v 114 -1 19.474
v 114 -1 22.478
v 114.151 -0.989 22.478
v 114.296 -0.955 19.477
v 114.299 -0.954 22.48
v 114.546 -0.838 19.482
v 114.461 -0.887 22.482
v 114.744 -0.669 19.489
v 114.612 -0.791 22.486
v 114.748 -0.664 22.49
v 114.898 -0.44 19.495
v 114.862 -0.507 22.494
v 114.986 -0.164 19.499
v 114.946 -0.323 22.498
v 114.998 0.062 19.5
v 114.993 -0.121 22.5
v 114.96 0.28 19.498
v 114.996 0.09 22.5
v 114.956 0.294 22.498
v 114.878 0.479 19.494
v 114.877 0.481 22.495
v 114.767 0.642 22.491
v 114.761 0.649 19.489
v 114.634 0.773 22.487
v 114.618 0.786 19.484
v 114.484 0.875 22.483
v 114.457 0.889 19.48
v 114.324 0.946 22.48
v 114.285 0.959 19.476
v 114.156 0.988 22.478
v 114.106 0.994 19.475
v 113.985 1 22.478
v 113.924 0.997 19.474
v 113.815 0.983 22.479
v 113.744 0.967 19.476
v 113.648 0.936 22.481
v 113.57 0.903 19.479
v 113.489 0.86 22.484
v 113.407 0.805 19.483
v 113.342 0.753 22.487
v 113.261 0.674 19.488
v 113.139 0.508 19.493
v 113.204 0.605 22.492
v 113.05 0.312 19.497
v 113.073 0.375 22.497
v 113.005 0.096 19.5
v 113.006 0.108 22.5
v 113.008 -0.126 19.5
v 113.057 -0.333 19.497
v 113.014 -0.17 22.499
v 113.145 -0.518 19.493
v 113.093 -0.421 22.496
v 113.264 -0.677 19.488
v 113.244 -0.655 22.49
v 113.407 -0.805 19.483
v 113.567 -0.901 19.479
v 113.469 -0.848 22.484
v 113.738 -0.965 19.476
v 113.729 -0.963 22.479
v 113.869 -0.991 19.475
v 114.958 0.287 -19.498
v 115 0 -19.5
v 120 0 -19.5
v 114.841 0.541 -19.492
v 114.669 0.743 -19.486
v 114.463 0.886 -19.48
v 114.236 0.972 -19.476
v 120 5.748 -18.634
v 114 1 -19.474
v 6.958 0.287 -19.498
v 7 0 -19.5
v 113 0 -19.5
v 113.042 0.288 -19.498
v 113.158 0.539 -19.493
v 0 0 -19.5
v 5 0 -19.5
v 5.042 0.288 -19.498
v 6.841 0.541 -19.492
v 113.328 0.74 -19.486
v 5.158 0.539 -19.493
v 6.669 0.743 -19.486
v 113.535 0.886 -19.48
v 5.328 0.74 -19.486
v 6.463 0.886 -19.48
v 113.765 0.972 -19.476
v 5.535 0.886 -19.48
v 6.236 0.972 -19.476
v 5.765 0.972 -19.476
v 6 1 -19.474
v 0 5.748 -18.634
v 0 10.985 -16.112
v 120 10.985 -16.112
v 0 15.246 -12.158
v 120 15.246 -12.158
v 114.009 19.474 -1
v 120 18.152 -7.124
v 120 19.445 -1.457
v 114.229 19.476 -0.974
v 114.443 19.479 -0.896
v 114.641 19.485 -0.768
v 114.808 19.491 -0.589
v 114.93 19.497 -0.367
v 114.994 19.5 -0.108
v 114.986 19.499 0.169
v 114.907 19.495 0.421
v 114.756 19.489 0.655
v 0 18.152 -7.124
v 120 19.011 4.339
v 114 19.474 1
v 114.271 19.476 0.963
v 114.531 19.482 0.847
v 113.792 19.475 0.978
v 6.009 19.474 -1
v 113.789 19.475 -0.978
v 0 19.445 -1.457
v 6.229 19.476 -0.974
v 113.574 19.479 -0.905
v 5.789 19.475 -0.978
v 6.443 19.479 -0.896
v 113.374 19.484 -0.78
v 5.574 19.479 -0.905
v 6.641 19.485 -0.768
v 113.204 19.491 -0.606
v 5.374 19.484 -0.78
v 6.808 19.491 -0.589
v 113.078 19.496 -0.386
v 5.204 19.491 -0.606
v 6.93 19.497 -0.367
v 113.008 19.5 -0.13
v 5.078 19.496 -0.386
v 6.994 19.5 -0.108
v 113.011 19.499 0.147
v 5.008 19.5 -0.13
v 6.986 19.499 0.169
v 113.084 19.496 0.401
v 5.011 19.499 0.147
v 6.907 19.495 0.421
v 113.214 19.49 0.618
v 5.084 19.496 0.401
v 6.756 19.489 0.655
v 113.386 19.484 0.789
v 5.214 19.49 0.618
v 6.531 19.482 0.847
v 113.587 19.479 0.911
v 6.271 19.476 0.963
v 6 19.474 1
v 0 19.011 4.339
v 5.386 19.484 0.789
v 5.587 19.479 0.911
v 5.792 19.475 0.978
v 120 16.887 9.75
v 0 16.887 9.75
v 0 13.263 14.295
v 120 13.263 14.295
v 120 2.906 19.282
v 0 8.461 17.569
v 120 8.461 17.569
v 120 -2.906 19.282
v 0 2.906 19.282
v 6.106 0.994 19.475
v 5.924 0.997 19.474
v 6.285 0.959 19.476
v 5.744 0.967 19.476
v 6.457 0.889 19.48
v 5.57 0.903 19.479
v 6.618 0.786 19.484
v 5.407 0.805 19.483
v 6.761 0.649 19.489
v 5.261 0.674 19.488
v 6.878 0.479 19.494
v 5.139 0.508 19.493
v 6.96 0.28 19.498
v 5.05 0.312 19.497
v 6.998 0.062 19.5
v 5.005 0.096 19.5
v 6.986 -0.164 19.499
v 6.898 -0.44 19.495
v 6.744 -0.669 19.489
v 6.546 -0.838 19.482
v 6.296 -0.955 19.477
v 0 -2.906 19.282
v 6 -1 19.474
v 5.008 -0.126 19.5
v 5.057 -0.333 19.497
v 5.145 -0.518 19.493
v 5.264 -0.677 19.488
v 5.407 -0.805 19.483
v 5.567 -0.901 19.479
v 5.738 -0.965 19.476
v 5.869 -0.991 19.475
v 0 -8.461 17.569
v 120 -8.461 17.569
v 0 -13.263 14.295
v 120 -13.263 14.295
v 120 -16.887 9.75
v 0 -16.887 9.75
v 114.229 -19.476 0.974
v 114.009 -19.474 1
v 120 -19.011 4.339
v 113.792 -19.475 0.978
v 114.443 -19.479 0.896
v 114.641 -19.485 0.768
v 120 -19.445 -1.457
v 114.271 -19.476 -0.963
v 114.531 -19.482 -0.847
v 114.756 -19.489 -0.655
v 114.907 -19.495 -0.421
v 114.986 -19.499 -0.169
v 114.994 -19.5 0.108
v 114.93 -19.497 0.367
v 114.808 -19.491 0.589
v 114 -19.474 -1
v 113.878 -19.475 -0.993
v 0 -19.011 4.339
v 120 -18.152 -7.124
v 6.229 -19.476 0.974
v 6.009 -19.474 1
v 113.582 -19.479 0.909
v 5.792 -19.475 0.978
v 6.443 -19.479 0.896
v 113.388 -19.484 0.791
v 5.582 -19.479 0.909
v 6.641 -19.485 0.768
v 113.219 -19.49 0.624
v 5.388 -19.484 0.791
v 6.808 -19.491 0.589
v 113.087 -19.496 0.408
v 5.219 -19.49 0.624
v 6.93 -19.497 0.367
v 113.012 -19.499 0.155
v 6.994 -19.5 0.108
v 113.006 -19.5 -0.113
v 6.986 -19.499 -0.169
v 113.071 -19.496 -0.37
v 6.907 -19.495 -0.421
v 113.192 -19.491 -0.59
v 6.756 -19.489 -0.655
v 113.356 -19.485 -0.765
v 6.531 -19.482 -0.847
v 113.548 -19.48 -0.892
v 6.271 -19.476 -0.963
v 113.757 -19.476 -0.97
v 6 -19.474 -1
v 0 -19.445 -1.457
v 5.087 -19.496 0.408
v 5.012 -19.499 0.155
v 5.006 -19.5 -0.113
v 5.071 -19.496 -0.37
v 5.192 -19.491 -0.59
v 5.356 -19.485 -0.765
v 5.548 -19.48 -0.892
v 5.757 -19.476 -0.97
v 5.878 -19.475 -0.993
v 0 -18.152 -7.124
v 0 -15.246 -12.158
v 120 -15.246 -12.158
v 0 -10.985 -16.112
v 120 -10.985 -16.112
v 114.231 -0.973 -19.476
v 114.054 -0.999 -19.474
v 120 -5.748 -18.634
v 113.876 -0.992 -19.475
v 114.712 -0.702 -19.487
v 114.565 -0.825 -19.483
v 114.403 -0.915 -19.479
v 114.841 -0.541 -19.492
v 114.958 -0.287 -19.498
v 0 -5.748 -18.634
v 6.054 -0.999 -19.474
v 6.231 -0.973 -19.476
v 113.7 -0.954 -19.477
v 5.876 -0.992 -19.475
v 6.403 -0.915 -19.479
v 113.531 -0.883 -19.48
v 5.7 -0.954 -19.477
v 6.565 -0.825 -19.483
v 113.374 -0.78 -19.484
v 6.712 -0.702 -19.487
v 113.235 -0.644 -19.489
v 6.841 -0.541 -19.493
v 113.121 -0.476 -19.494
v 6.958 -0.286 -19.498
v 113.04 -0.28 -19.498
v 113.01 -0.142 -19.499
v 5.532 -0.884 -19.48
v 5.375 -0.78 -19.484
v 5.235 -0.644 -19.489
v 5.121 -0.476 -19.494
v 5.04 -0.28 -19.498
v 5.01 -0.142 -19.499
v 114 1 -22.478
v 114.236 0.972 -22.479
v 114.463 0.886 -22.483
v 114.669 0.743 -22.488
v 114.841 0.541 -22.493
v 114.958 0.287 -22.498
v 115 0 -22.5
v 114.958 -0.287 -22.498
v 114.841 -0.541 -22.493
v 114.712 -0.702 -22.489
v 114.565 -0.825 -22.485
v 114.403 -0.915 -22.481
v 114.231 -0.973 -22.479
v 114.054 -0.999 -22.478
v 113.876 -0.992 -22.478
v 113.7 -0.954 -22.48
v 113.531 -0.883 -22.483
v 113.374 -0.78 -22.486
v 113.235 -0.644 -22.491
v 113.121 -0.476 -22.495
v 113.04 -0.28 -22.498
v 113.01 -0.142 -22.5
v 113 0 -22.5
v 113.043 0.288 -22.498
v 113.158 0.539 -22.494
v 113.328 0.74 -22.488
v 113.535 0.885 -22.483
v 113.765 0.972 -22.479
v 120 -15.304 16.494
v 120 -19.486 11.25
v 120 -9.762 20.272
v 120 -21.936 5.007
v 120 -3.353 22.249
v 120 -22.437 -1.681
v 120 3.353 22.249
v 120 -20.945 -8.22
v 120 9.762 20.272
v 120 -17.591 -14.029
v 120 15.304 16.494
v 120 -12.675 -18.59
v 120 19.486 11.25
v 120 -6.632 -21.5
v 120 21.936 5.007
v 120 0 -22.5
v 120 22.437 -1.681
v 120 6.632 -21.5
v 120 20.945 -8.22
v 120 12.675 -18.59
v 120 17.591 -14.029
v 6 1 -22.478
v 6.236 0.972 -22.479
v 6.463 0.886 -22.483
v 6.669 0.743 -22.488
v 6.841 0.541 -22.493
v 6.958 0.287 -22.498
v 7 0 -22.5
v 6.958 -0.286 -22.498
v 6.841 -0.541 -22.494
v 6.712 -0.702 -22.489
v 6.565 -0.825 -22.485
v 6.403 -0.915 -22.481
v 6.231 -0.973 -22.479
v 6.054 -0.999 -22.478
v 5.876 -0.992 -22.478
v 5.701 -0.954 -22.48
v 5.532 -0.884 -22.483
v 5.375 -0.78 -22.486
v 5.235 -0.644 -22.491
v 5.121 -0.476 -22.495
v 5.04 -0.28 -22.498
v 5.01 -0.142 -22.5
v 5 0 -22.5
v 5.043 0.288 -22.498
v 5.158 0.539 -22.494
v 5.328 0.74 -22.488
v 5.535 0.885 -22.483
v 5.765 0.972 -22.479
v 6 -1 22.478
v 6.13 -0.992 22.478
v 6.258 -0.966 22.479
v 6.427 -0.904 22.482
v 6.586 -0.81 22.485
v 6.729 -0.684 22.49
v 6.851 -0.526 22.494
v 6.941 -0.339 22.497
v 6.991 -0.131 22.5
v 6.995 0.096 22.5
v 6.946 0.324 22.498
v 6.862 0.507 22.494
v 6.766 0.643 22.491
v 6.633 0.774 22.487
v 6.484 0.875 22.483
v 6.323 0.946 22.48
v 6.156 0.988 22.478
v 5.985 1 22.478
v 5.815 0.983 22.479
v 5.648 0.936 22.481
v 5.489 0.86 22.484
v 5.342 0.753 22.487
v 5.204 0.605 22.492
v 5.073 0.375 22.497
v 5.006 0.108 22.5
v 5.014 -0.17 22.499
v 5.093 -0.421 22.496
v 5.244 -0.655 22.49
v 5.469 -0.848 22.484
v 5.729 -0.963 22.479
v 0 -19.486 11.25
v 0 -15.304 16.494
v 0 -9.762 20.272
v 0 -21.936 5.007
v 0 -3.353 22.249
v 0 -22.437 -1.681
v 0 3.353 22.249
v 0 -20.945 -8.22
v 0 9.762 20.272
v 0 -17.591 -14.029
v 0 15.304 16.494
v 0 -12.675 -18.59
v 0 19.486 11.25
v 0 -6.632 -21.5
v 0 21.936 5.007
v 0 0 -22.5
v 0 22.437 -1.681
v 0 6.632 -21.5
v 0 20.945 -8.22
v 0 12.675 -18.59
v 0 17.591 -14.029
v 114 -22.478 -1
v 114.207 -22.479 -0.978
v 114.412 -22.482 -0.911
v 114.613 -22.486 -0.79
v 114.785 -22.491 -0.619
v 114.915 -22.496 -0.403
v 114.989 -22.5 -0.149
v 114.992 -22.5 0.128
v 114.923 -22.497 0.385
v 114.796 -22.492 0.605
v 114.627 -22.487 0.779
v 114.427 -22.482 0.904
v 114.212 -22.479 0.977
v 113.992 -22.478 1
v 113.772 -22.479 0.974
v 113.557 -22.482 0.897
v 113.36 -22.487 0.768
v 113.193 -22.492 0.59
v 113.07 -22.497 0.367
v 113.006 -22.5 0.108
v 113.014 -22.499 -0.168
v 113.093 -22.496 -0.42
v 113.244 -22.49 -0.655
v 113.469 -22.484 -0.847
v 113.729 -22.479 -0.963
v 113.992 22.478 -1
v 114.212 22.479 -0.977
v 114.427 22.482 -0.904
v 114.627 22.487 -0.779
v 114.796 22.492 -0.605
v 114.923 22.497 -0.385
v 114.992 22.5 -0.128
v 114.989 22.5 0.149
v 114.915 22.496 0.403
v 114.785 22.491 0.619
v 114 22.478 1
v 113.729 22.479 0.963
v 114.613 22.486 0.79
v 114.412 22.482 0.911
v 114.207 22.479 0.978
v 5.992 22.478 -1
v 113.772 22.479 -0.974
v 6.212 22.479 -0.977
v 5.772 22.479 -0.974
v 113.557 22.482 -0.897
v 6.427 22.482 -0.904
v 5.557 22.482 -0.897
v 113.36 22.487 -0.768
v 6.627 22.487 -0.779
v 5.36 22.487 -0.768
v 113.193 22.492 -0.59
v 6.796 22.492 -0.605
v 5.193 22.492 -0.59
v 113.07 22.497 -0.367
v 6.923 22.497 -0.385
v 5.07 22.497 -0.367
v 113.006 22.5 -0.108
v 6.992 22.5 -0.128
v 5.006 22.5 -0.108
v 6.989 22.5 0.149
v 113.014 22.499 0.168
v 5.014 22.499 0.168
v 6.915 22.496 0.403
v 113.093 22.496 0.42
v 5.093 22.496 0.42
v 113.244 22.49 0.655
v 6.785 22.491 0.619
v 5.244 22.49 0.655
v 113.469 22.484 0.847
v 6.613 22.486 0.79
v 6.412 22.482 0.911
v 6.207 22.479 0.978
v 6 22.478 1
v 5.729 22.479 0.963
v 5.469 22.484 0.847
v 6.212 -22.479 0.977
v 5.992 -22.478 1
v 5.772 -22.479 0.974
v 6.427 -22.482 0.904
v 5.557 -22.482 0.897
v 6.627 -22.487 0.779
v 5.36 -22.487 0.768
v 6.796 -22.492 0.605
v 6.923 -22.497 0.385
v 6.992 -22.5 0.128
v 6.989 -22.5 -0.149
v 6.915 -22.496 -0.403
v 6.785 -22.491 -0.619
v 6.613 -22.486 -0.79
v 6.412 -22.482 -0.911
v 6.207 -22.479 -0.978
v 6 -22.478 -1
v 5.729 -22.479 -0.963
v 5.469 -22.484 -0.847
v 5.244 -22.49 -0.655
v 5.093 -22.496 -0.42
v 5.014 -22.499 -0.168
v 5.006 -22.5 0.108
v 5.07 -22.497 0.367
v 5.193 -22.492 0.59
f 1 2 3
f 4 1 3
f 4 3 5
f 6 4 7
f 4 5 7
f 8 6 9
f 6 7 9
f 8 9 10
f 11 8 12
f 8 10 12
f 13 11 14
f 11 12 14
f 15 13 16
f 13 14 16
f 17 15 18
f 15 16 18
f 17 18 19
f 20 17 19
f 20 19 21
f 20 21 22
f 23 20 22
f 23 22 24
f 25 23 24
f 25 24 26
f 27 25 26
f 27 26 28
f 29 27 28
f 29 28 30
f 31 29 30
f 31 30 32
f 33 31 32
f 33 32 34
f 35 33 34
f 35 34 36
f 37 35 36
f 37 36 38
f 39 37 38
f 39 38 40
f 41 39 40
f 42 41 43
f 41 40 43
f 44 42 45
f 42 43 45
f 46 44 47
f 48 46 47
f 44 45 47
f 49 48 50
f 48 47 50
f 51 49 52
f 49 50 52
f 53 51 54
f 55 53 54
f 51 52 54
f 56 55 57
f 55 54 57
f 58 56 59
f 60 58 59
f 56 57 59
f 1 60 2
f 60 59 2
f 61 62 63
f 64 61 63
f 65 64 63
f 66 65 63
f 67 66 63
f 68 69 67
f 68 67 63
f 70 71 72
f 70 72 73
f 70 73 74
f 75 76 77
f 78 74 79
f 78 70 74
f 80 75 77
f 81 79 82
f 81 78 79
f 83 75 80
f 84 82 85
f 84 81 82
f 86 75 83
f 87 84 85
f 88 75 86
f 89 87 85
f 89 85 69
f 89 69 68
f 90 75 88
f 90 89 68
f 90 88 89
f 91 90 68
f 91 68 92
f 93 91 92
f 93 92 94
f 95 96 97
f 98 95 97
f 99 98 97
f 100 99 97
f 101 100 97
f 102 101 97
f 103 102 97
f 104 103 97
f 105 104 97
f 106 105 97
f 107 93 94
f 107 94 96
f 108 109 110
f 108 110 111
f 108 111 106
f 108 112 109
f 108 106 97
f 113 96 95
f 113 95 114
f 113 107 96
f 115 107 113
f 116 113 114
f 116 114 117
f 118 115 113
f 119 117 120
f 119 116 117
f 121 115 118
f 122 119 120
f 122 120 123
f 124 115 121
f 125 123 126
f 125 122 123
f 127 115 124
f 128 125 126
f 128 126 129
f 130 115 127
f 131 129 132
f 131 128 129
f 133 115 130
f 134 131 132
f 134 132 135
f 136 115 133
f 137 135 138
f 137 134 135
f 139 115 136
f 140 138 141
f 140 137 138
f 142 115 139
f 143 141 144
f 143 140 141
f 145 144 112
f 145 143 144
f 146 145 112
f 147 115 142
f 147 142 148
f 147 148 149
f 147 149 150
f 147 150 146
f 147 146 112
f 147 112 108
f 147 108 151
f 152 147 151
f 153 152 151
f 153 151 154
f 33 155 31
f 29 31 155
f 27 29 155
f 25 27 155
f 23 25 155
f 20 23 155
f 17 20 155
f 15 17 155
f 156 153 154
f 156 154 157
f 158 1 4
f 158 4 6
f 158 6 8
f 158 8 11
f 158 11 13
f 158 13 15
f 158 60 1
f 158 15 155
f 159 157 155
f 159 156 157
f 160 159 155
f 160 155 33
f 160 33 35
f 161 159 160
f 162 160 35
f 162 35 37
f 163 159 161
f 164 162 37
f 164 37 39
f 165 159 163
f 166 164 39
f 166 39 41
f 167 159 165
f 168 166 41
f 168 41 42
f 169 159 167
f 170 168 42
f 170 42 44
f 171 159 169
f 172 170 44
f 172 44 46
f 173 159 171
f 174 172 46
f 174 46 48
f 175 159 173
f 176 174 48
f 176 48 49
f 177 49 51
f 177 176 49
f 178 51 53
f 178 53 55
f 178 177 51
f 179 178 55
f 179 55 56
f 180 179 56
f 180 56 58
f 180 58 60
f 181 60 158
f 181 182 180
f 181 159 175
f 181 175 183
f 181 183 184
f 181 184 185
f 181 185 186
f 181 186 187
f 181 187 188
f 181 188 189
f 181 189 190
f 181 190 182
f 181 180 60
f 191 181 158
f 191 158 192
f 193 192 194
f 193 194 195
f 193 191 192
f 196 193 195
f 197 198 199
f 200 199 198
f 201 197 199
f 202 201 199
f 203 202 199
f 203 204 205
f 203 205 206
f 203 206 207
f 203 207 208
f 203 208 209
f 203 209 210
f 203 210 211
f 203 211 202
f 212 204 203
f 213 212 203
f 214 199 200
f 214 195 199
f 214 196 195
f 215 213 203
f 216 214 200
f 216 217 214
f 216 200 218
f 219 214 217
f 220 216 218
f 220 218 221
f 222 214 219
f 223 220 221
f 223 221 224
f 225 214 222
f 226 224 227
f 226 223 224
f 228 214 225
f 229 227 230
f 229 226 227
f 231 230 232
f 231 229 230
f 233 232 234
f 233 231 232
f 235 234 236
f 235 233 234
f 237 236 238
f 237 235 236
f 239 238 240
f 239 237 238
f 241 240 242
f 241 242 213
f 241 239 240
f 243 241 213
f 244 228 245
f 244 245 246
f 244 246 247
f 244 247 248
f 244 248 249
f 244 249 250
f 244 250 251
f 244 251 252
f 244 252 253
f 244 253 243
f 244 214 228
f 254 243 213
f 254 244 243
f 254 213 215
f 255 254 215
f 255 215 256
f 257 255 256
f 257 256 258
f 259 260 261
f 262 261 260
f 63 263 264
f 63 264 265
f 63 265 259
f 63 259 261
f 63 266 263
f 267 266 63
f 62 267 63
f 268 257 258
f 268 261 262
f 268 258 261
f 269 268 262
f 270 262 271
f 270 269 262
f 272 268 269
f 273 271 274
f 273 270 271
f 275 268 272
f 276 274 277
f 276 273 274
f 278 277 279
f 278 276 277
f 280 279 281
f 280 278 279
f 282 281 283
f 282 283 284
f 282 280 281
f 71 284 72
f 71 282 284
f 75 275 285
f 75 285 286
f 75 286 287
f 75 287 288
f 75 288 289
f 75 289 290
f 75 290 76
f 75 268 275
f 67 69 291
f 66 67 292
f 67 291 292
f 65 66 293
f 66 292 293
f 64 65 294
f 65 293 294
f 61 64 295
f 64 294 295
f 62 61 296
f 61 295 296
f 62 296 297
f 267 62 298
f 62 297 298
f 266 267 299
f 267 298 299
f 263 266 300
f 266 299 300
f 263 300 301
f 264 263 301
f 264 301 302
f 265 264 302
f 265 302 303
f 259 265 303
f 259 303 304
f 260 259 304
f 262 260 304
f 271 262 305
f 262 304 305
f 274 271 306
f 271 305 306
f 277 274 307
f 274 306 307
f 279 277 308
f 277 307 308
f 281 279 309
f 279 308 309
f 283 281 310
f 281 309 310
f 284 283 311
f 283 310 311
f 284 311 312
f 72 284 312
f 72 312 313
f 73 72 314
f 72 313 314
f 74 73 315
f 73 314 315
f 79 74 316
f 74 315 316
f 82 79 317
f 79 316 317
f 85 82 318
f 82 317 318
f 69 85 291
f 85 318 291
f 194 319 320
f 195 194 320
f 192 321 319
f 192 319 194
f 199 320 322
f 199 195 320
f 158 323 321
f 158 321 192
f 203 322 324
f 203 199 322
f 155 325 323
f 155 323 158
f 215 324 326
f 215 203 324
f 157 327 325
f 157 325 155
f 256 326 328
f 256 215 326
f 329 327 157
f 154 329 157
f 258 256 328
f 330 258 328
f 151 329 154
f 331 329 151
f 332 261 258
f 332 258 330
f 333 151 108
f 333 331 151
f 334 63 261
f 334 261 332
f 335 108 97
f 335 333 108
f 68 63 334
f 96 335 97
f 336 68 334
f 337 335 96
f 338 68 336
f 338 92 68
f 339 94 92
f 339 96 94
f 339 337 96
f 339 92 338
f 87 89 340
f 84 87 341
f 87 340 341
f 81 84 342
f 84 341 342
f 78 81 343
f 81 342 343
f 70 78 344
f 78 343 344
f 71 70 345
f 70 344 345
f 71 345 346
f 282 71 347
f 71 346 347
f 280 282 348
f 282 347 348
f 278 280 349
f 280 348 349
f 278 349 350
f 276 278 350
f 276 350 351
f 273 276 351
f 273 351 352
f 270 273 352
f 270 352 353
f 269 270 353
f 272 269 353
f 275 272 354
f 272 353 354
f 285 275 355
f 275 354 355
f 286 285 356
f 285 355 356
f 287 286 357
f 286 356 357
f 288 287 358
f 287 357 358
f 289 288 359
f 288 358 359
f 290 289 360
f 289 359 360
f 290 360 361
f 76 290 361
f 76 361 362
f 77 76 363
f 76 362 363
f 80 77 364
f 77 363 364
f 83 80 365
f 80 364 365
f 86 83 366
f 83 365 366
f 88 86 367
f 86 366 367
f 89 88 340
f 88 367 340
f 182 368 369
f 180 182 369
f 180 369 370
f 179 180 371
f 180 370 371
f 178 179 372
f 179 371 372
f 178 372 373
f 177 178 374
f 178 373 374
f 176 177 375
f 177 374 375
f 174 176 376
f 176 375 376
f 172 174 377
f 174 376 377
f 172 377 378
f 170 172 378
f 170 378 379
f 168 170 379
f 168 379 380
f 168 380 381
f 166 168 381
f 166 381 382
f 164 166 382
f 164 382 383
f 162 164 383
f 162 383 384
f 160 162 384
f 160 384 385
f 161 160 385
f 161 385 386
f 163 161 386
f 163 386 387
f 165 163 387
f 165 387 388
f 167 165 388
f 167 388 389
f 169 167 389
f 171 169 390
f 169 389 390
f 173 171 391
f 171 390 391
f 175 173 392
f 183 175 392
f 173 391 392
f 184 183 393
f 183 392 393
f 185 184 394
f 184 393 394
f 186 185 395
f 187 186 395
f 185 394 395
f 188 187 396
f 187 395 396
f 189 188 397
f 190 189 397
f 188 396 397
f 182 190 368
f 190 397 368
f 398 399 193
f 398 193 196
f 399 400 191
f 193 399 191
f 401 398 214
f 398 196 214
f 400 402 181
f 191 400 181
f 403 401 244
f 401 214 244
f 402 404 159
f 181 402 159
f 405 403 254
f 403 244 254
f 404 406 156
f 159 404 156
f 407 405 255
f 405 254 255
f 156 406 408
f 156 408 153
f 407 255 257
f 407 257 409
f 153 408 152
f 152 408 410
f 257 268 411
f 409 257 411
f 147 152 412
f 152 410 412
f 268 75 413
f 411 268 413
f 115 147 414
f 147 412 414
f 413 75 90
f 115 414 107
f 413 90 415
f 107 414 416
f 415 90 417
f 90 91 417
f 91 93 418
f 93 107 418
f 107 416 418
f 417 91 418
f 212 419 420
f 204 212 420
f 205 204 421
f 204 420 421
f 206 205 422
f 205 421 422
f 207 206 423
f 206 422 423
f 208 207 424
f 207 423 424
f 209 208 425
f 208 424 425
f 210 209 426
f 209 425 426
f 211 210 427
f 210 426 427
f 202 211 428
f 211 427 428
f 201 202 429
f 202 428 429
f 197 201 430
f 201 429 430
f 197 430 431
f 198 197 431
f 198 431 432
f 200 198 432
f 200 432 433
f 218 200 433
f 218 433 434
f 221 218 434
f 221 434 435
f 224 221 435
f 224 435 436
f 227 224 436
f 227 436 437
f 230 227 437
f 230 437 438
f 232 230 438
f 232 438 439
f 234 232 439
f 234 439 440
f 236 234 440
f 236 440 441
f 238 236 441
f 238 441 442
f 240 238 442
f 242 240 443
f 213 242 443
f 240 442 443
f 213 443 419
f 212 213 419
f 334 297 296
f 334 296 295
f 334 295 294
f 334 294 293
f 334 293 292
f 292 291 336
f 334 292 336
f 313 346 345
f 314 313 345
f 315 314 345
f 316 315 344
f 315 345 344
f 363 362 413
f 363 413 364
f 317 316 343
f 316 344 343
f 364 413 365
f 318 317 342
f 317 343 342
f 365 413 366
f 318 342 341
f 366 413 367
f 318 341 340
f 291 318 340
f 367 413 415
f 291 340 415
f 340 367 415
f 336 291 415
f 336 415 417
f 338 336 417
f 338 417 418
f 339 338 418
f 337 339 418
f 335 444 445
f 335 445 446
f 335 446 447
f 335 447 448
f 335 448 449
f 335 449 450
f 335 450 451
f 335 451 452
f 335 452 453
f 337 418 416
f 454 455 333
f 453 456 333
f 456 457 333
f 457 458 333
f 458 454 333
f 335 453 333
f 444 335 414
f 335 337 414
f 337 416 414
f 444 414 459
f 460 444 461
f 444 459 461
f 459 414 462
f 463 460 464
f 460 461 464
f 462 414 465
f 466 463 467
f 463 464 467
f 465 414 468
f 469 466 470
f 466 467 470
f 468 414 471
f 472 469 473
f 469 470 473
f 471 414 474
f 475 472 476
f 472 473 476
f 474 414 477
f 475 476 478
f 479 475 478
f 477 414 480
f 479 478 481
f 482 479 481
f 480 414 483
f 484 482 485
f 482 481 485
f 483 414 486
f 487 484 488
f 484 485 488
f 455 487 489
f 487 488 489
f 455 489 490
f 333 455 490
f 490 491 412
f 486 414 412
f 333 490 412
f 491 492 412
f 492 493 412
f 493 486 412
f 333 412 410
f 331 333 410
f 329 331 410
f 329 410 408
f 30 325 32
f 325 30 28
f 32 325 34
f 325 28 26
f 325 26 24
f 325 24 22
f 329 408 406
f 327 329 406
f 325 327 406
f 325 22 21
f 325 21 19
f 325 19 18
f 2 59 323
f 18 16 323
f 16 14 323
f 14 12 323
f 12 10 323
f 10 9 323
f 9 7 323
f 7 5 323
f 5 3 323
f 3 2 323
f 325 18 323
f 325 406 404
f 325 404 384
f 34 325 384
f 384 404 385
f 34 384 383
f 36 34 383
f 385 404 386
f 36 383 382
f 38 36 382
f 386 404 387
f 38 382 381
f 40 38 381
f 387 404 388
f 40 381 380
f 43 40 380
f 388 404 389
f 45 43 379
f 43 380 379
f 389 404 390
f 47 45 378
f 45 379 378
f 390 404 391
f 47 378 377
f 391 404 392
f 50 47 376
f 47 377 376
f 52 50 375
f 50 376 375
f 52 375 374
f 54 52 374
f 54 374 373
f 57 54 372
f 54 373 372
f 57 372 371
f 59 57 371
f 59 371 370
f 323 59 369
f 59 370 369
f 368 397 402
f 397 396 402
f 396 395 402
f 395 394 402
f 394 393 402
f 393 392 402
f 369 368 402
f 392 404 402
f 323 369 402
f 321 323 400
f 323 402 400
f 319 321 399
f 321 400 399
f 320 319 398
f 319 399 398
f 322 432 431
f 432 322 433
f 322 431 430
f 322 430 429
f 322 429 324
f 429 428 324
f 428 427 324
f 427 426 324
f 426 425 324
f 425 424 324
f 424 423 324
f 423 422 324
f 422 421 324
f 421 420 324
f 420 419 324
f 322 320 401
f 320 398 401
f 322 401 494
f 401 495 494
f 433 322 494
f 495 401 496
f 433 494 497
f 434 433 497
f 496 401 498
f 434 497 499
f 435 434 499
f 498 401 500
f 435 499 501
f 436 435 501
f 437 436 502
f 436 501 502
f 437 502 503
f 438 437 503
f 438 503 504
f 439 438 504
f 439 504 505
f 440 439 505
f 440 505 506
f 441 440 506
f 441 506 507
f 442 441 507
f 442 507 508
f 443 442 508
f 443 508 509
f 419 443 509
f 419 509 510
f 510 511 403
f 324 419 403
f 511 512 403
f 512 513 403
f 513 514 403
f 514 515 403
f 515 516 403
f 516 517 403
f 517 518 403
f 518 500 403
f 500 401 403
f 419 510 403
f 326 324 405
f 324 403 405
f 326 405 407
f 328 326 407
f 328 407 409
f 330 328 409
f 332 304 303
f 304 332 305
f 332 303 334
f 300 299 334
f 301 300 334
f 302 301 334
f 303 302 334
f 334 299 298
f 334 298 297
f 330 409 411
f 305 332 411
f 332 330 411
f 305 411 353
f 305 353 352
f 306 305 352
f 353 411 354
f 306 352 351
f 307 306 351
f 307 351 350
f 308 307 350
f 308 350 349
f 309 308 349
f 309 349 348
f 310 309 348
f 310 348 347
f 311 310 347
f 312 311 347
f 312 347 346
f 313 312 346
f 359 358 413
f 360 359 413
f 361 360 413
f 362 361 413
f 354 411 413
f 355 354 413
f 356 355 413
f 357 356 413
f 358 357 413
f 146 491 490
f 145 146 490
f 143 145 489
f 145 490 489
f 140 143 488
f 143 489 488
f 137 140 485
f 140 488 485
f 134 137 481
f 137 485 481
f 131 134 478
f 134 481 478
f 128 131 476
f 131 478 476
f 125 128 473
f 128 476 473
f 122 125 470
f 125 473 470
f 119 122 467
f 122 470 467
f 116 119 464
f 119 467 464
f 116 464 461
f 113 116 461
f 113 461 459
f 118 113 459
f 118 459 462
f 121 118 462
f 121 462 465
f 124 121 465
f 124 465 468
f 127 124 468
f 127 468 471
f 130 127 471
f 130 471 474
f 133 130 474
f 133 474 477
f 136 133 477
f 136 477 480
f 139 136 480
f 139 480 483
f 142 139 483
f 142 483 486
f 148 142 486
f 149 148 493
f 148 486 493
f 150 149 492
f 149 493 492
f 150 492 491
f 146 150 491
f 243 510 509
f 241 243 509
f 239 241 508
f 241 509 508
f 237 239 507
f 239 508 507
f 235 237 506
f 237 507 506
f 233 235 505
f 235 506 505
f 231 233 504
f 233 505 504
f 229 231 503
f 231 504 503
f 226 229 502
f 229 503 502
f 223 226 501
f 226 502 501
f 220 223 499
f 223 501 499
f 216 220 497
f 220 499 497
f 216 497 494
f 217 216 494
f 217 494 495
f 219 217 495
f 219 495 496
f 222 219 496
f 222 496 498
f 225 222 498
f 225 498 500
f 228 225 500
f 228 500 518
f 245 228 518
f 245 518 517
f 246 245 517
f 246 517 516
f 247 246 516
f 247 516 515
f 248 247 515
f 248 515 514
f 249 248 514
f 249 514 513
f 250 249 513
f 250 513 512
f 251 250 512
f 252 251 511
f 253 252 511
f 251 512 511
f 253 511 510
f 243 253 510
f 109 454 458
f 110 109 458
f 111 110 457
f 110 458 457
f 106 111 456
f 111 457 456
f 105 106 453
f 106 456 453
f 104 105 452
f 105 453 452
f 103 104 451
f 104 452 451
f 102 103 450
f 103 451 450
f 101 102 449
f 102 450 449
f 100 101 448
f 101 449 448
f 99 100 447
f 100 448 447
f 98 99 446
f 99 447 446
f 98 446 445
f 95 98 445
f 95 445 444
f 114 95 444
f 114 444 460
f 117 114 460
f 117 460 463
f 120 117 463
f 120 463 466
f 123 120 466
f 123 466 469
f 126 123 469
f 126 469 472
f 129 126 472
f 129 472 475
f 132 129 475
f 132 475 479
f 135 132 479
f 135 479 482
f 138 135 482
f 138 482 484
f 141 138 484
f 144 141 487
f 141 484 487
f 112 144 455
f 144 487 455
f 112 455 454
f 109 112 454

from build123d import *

# Parameters (mm, degrees)
SKETCH_1_R               = 22.5
SKETCH_1_R_2             = 19.5
EXTRUDE_1_DEPTH          = 120
SKETCH_3_R               = 1
CUT_EXTRUDE_1_DEPTH      = 10
PATTERN_CIRCULAR_1_COUNT = 4


with BuildPart() as part:
    # Эскиз1 → Бобышка-Вытянуть1 (new body)
    with BuildSketch(Plane(origin=(0, 0, 0), x_dir=(0, 0, -1), z_dir=(1, 0, 0))):
        Circle(SKETCH_1_R)
        Circle(SKETCH_1_R_2, mode=Mode.SUBTRACT)
    extrude(amount=EXTRUDE_1_DEPTH)

    # Эскиз3 → Вырез-Вытянуть1 (cut)
    with BuildSketch(Plane(origin=(0, 22.5, 0), x_dir=(1, 0, 0), z_dir=(0, 1, 0))):
        with Locations(Location((6, 0, 0), (0, 0, 270))):
            Circle(SKETCH_3_R)
        with Locations(Location((114, 0, 0), (0, 0, 270))):
            Circle(SKETCH_3_R)
    cut_extrude_1 = extrude(amount=-CUT_EXTRUDE_1_DEPTH, mode=Mode.SUBTRACT)

    # Круговой массив1: Вырез-Вытянуть1 ×4 about axis
    pattern_circular_1_axis = Axis((120, 0, 0), (-1, 0, 0))
    for i in range(1, PATTERN_CIRCULAR_1_COUNT):
        add(cut_extrude_1.rotate(pattern_circular_1_axis, i * 360 / PATTERN_CIRCULAR_1_COUNT), mode=Mode.SUBTRACT)


solid = part.part
